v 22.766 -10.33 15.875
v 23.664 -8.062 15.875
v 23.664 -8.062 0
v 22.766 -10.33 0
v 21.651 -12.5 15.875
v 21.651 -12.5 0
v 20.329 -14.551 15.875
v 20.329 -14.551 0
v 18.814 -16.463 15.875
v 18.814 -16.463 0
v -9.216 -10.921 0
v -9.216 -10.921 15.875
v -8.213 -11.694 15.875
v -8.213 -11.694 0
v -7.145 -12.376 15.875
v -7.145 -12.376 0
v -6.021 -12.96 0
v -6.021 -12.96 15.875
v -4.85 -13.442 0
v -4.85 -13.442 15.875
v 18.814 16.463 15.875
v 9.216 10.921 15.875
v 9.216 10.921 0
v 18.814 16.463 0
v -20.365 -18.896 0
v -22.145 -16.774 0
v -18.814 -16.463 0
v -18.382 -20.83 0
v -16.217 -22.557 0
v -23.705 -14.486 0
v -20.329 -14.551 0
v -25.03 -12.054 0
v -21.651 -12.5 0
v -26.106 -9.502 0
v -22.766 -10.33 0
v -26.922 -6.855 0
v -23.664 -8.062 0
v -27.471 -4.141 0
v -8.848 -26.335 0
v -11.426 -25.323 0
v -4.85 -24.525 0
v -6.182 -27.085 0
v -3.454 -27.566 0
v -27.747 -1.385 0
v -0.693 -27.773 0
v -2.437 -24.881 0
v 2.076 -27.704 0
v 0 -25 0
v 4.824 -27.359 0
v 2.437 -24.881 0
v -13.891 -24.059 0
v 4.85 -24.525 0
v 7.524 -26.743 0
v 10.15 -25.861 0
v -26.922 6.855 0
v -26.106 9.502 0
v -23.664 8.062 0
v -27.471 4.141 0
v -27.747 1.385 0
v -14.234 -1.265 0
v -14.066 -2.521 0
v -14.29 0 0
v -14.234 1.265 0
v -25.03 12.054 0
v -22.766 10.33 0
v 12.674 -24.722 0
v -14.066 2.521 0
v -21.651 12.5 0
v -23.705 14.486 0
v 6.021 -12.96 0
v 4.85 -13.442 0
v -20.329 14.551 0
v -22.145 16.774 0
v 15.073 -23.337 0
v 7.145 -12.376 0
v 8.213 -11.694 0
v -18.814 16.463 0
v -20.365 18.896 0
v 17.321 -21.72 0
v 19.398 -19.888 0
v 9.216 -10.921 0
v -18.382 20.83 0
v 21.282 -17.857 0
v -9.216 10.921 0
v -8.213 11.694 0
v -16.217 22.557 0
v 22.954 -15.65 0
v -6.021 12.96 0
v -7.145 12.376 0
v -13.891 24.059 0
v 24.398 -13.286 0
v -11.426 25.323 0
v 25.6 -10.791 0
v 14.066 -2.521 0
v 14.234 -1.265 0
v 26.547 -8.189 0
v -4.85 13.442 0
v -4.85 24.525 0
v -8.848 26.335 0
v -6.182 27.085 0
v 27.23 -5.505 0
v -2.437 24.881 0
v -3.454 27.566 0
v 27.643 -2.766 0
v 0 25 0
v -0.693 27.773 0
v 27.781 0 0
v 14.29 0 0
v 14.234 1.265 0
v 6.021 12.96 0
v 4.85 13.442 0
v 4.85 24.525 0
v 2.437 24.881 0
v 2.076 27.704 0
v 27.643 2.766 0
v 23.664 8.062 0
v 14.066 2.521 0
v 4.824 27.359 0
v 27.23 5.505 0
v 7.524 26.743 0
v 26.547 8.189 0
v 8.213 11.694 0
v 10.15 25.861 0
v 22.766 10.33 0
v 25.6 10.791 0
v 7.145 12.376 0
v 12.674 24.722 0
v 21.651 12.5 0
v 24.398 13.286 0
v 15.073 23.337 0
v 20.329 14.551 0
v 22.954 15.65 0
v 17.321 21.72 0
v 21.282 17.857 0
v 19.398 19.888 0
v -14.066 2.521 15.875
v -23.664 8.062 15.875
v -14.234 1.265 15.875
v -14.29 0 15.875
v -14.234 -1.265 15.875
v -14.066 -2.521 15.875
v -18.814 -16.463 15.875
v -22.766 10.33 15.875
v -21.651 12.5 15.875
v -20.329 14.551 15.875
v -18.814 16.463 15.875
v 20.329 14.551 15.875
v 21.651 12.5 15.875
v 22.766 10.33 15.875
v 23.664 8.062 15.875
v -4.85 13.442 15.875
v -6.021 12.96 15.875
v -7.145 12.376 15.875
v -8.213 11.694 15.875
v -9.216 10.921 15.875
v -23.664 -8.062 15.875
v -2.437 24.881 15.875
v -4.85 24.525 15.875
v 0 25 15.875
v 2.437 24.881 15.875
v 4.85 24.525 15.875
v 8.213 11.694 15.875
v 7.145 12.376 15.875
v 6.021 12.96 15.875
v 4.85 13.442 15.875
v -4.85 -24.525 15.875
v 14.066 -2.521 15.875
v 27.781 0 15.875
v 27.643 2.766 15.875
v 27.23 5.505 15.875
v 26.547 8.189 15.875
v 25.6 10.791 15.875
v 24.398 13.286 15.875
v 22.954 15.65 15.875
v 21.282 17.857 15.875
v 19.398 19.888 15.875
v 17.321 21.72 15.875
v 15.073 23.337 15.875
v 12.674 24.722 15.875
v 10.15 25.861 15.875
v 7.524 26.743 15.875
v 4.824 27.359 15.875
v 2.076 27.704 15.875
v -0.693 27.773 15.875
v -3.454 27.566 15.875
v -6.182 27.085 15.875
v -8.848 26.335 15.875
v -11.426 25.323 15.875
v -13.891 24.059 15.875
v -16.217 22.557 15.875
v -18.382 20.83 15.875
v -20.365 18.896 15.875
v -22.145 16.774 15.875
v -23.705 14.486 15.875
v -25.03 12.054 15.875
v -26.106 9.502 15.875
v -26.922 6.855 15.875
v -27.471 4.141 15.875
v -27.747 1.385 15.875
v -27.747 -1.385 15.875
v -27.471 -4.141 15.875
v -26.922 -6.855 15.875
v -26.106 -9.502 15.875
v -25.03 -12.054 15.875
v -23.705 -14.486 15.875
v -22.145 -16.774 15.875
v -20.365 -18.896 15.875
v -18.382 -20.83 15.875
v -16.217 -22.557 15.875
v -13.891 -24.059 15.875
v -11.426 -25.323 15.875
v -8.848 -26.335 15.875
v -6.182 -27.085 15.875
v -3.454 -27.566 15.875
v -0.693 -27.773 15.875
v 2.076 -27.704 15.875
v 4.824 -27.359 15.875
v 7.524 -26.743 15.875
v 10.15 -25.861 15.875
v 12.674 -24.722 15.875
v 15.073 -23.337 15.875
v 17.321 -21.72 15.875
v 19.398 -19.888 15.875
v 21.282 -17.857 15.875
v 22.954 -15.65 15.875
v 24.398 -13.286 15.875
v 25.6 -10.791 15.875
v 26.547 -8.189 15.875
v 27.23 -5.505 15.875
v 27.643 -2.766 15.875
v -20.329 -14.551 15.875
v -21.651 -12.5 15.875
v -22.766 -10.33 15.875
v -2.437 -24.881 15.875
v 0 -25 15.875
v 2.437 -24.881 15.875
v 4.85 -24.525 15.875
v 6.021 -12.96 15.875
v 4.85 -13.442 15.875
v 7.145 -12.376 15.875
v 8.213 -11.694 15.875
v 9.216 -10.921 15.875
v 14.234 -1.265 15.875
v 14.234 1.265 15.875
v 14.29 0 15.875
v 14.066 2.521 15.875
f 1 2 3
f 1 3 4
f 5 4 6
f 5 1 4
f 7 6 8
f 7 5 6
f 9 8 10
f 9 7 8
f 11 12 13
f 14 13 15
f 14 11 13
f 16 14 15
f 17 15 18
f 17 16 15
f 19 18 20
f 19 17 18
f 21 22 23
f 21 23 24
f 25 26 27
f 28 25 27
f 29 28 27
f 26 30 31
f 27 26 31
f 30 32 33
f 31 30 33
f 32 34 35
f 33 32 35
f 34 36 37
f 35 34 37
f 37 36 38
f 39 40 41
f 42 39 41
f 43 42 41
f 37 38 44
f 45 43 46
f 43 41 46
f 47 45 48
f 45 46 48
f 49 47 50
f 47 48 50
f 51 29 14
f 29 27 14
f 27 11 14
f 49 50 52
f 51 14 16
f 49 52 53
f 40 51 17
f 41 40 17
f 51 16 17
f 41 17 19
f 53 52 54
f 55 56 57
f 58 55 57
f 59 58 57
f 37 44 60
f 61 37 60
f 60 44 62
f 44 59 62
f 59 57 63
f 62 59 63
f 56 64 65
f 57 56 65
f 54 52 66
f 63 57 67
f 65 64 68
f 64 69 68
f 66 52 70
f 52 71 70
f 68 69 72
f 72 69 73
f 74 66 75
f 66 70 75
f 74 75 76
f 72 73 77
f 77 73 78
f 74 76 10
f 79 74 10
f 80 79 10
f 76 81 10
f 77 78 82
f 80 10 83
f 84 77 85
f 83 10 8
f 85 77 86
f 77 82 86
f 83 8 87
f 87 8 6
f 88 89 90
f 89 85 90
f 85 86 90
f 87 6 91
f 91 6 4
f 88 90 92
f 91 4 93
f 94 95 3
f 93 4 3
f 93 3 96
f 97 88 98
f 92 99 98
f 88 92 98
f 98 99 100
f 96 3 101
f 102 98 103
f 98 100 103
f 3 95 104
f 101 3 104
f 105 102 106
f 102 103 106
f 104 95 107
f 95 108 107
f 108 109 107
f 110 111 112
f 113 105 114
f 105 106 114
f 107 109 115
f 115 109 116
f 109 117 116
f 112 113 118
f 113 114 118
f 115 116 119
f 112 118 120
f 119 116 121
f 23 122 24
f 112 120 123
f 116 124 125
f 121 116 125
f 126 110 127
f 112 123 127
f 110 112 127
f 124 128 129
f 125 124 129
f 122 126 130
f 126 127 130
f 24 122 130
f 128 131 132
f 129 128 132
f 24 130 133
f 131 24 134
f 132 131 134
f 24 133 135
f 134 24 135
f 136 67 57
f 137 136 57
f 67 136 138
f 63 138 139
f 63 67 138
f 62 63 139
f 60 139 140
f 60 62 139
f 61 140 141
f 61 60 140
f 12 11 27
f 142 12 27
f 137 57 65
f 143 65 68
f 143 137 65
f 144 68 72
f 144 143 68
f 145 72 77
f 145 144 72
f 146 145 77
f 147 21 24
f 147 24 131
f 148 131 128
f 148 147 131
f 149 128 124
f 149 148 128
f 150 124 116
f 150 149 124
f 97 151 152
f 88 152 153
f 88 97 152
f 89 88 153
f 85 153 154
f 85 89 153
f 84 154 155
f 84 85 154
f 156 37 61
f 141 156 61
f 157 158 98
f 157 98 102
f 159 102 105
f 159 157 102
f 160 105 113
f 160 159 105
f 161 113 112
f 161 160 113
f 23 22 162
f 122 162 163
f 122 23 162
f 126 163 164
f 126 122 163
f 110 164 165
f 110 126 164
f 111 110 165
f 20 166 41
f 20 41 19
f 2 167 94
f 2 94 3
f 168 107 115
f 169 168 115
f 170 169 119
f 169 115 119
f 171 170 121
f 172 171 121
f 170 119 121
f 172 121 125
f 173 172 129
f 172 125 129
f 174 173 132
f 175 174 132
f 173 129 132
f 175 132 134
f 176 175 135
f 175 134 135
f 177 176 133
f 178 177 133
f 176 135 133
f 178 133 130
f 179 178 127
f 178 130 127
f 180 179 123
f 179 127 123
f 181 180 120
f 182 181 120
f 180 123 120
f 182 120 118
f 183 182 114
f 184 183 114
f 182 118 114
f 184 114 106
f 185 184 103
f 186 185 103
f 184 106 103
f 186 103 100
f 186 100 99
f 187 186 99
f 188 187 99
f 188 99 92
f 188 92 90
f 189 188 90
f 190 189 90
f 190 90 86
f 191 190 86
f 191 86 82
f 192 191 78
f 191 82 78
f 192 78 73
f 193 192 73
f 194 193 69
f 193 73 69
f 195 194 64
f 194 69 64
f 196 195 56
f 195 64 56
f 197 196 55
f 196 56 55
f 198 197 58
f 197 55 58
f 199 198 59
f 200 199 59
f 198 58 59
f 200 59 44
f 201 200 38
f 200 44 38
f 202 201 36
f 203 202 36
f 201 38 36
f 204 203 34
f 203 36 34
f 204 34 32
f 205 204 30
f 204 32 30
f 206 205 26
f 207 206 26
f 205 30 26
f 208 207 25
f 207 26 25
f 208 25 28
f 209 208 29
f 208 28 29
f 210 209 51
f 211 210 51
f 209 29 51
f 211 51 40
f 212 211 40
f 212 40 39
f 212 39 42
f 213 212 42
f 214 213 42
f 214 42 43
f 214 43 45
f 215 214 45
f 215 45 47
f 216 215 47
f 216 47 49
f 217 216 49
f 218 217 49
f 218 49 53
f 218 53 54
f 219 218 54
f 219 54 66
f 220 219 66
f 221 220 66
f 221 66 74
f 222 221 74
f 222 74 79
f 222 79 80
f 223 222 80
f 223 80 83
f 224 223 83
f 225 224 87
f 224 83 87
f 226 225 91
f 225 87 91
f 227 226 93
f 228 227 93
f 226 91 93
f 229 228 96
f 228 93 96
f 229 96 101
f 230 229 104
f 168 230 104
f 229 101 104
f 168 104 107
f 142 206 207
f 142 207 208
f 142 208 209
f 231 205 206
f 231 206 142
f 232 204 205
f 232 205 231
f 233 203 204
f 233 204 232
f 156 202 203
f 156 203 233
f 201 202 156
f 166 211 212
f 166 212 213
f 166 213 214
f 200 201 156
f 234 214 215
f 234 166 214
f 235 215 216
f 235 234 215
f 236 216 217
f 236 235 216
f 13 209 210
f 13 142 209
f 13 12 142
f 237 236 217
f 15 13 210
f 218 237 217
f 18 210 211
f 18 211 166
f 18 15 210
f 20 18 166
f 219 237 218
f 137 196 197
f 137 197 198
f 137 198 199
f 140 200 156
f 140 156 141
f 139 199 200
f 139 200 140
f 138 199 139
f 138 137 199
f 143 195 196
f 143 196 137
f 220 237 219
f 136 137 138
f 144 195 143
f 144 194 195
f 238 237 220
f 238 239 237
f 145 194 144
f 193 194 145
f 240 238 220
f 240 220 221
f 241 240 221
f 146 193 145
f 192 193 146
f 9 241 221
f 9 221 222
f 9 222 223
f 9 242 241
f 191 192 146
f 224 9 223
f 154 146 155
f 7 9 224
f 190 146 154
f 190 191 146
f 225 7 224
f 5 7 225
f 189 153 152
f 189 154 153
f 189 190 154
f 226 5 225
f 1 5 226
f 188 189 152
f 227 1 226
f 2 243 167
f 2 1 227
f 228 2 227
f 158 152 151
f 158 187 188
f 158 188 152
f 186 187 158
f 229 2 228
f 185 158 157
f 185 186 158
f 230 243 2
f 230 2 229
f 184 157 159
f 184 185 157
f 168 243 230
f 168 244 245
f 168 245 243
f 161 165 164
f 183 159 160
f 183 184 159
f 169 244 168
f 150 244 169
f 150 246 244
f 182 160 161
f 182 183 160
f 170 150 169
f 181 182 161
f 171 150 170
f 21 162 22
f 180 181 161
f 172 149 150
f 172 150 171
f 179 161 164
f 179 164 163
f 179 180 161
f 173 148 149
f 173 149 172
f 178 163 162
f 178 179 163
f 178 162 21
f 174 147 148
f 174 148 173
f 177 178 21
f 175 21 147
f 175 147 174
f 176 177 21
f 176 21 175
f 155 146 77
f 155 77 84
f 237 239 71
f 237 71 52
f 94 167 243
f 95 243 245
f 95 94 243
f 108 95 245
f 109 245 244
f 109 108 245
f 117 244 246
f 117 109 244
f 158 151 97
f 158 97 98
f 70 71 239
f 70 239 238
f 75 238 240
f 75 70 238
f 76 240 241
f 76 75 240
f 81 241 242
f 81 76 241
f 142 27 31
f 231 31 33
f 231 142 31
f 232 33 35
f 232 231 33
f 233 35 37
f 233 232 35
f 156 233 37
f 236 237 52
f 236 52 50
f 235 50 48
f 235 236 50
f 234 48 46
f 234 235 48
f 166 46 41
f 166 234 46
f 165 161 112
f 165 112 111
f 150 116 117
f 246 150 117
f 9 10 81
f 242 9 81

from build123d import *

# Parameters (mm, degrees)
SKETCH1_R           = 27.78125
SKETCH1_R_2         = 14.29
BOSS_EXTRUDE1_DEPTH = 15.875
CUT_EXTRUDE1_DEPTH  = 16.875


with BuildPart() as part:
    # Sketch1 → Boss-Extrude1 (new body)
    with BuildSketch(Plane.XY):
        Circle(SKETCH1_R)
        Circle(SKETCH1_R_2, mode=Mode.SUBTRACT)
    extrude(amount=BOSS_EXTRUDE1_DEPTH)

    # Sketch3 → Cut-Extrude1 (cut, through all)
    with BuildSketch(Plane.XY.offset(15.875)):
        with BuildLine():
            Line((18.814306165, -16.462742285), (4.849999952, -8.400446334))
            Line((4.849999952, -8.400446334), (4.849999952, -24.525038236))
            ThreePointArc((4.849999952, -24.525038236), (-4.9e-08, -25), (-4.850000048, -24.525038217))
            Line((-4.850000048, -24.525038217), (-4.850000048, -8.4004465))
            Line((-4.850000048, -8.4004465), (-18.814306101, -16.462742358))
            ThreePointArc((-18.814306101, -16.462742358), (-21.65063507, -12.500000042), (-23.664306117, -8.062295951))
            Line((-23.664306117, -8.062295951), (-9.699999904, 0))
            Line((-9.699999904, 0), (-23.664306117, 8.062295951))
            ThreePointArc((-23.664306117, 8.062295951), (-21.65063507, 12.500000042), (-18.814306101, 16.462742358))
            Line((-18.814306101, 16.462742358), (-4.850000048, 8.4004465))
            Line((-4.850000048, 8.4004465), (-4.850000048, 24.525038217))
            ThreePointArc((-4.850000048, 24.525038217), (-4.9e-08, 25), (4.849999952, 24.525038236))
            Line((4.849999952, 24.525038236), (4.849999952, 8.400446334))
            Line((4.849999952, 8.400446334), (18.814306165, 16.462742285))
            ThreePointArc((18.814306165, 16.462742285), (21.650635119, 12.499999958), (23.664306149, 8.062295858))
            Line((23.664306149, 8.062295858), (9.700000096, 0))
            Line((9.700000096, 0), (23.664306149, -8.062295858))
            ThreePointArc((23.664306149, -8.062295858), (21.650635119, -12.499999958), (18.814306165, -16.462742285))
        make_face()
    extrude(amount=-CUT_EXTRUDE1_DEPTH, mode=Mode.SUBTRACT)


solid = part.part
